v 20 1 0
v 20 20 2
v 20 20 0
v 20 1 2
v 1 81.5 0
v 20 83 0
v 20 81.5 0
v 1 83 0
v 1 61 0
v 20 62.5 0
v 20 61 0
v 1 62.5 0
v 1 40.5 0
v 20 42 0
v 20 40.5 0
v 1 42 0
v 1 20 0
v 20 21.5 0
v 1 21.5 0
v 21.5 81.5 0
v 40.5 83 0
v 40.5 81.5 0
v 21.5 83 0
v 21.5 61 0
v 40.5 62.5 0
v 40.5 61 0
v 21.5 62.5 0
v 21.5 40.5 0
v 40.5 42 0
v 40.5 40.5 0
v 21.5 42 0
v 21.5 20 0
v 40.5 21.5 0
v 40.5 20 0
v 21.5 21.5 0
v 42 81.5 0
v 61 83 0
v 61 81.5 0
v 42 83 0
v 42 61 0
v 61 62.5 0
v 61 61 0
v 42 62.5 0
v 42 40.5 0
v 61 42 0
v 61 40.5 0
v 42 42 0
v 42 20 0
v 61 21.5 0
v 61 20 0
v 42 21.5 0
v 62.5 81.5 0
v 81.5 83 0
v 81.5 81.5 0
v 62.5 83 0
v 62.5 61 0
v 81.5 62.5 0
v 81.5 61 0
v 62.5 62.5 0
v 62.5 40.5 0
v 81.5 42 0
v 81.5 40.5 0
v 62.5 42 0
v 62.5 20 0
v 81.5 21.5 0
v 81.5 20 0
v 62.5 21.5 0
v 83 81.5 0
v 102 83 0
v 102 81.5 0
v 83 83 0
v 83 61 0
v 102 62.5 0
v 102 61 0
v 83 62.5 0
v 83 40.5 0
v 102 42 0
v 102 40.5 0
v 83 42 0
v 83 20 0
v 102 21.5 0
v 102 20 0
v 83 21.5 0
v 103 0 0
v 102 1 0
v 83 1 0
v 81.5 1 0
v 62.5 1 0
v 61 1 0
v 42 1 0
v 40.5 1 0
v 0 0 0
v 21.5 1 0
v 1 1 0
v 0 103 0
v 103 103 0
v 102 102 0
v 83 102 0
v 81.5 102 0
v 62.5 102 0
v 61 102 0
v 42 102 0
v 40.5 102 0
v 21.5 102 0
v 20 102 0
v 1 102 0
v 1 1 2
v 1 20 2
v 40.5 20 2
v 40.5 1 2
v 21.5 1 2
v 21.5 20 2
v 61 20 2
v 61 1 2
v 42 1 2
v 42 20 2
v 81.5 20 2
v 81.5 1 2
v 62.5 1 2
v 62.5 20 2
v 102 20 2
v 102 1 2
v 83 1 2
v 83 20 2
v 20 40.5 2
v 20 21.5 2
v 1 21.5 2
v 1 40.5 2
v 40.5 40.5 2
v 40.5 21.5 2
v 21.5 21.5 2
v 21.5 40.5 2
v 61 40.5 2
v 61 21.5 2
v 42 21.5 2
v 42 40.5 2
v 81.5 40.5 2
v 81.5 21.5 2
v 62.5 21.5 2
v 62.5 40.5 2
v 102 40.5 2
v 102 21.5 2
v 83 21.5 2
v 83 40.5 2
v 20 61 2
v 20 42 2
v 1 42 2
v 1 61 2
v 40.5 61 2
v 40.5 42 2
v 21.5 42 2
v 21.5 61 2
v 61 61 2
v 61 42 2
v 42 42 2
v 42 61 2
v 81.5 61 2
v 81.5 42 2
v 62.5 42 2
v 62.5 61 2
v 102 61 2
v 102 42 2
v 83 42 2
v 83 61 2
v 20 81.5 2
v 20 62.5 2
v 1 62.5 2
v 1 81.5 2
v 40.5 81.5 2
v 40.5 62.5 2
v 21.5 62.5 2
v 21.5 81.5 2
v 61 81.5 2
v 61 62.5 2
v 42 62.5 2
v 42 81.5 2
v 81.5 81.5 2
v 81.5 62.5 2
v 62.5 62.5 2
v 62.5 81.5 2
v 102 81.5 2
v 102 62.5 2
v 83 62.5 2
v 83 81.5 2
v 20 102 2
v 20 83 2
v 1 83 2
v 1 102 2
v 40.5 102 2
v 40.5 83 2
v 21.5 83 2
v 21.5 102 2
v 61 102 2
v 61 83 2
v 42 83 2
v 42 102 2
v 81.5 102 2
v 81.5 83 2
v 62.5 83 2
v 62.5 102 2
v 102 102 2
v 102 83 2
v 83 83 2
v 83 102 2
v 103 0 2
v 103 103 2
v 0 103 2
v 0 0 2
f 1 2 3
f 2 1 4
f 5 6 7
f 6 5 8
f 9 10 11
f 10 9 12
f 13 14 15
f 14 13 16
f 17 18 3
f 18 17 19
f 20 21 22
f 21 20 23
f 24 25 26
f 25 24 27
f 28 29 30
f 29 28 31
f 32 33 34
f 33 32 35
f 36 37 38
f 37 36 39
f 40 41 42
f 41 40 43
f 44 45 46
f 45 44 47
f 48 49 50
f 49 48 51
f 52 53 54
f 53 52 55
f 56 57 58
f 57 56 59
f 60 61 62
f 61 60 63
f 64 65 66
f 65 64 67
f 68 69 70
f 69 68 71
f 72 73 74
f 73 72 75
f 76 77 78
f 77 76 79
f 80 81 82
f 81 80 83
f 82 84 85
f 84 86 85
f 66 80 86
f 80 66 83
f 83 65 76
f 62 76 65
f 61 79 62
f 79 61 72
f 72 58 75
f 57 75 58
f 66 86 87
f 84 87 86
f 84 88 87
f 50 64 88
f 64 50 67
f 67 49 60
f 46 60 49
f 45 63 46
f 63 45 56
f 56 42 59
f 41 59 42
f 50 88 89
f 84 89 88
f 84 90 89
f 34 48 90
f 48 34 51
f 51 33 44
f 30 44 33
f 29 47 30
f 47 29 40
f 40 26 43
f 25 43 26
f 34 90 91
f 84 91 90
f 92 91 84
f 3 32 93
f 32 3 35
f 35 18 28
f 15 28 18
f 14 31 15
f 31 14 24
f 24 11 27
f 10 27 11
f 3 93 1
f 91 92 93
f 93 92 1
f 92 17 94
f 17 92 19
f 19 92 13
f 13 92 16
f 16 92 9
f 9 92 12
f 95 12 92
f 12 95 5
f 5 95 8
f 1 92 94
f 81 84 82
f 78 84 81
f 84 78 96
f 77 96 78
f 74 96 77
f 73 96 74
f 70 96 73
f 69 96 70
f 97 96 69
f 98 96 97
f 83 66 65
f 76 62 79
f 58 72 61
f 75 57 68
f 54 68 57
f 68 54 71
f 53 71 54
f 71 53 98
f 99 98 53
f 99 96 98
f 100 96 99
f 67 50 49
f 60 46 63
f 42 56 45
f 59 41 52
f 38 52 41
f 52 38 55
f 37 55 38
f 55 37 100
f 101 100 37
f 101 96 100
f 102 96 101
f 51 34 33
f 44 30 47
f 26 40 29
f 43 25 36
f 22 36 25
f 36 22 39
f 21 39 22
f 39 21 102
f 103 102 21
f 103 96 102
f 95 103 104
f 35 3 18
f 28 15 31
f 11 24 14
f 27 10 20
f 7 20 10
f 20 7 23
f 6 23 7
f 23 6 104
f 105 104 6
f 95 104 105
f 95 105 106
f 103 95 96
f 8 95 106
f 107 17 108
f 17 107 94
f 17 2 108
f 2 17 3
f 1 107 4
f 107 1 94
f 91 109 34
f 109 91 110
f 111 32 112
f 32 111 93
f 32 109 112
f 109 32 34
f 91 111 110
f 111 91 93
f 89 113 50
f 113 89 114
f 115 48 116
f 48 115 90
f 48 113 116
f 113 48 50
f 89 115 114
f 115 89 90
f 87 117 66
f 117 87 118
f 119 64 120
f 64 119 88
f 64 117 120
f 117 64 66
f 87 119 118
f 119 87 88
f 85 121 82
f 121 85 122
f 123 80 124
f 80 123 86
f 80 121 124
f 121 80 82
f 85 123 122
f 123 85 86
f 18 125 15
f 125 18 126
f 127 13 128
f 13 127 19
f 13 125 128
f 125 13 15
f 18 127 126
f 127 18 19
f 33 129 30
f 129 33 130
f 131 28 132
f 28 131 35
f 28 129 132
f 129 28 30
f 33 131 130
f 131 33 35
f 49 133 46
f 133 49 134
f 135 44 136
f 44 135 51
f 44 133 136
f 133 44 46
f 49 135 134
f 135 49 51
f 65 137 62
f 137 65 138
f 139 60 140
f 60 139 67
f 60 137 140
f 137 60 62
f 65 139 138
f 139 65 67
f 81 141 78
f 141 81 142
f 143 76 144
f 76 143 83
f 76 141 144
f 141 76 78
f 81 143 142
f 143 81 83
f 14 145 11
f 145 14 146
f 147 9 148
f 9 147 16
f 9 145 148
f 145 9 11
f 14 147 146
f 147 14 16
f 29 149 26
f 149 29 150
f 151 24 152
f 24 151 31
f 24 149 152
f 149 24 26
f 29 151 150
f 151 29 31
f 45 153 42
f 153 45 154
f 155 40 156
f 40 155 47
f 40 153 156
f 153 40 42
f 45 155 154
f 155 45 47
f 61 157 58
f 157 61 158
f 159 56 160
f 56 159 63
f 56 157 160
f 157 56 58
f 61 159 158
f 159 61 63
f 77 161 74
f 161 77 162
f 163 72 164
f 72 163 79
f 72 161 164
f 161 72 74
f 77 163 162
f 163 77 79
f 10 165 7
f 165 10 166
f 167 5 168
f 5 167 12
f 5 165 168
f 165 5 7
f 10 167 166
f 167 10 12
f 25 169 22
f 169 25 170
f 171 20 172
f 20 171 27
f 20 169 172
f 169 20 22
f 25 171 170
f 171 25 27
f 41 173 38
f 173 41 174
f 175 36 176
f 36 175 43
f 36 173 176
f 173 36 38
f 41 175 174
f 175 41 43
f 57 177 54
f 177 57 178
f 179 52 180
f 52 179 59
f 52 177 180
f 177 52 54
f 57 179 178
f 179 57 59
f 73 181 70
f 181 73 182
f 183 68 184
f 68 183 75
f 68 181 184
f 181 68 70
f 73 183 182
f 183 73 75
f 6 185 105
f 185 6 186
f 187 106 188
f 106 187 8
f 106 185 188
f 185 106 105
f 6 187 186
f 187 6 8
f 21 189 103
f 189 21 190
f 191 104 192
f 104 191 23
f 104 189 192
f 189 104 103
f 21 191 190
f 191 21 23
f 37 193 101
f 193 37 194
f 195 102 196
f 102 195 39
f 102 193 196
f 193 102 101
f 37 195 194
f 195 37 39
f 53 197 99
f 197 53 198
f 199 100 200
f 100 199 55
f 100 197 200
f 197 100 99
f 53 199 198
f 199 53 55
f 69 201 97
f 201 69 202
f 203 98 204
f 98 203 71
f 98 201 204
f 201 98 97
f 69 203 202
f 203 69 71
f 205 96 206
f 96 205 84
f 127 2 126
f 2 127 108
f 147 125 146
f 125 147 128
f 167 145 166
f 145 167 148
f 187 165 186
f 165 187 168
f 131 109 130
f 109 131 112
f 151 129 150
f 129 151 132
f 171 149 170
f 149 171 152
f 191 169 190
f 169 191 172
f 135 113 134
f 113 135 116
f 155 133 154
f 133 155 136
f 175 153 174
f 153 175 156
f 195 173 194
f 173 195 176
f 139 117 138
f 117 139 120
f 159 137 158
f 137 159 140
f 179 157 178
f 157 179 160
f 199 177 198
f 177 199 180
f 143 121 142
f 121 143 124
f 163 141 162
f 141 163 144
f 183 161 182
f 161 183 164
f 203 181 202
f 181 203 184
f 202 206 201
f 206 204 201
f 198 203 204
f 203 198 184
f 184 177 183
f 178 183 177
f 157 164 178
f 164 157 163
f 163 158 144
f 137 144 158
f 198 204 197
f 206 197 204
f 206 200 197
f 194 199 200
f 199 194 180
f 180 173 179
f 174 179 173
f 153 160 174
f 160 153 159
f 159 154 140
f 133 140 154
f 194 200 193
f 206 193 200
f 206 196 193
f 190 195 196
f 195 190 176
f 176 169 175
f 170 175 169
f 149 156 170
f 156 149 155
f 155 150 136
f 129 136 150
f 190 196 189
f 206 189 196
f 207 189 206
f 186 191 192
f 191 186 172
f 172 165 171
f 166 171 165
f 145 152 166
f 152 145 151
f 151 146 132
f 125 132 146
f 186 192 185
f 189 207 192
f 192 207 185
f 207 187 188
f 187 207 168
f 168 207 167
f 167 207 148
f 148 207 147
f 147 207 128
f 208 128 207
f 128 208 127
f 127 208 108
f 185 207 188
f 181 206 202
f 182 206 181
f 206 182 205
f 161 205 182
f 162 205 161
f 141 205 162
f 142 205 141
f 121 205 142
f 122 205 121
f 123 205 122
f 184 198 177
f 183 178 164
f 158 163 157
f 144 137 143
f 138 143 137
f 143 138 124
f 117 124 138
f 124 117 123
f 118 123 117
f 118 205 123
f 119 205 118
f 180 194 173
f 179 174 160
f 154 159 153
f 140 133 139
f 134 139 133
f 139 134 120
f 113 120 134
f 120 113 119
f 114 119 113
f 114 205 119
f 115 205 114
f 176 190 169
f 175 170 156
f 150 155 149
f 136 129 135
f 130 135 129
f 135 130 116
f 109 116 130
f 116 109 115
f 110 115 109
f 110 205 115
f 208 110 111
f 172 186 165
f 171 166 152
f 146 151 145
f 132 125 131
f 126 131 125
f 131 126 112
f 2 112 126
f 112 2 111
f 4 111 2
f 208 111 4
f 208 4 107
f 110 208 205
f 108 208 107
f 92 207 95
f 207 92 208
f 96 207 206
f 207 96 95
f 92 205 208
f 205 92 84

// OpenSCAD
/* [Dimensions] */
// Measures of 116x116 mm for Azul tile board
// Measure of single tile 19x19 mm

// Width
WIDTH = 103;//[100:110]
// Thickness of walls
THICK = 1; //[1:4]
// height of top/bottom
HEIGHT = 02; //[01:05]


difference() {

cube([WIDTH,WIDTH,HEIGHT]); //create cube as hull for grid
 
    for ( y = [0:1:10]) {
    for ( i = [0:1:10]) {
    translate([THICK+i*20.5,THICK+y*20.5,0])cube([20-THICK,20-THICK,10]); //substract cubes from hull
        
    //translate([11,10,2])sphere(d=20); 
}
}
}
